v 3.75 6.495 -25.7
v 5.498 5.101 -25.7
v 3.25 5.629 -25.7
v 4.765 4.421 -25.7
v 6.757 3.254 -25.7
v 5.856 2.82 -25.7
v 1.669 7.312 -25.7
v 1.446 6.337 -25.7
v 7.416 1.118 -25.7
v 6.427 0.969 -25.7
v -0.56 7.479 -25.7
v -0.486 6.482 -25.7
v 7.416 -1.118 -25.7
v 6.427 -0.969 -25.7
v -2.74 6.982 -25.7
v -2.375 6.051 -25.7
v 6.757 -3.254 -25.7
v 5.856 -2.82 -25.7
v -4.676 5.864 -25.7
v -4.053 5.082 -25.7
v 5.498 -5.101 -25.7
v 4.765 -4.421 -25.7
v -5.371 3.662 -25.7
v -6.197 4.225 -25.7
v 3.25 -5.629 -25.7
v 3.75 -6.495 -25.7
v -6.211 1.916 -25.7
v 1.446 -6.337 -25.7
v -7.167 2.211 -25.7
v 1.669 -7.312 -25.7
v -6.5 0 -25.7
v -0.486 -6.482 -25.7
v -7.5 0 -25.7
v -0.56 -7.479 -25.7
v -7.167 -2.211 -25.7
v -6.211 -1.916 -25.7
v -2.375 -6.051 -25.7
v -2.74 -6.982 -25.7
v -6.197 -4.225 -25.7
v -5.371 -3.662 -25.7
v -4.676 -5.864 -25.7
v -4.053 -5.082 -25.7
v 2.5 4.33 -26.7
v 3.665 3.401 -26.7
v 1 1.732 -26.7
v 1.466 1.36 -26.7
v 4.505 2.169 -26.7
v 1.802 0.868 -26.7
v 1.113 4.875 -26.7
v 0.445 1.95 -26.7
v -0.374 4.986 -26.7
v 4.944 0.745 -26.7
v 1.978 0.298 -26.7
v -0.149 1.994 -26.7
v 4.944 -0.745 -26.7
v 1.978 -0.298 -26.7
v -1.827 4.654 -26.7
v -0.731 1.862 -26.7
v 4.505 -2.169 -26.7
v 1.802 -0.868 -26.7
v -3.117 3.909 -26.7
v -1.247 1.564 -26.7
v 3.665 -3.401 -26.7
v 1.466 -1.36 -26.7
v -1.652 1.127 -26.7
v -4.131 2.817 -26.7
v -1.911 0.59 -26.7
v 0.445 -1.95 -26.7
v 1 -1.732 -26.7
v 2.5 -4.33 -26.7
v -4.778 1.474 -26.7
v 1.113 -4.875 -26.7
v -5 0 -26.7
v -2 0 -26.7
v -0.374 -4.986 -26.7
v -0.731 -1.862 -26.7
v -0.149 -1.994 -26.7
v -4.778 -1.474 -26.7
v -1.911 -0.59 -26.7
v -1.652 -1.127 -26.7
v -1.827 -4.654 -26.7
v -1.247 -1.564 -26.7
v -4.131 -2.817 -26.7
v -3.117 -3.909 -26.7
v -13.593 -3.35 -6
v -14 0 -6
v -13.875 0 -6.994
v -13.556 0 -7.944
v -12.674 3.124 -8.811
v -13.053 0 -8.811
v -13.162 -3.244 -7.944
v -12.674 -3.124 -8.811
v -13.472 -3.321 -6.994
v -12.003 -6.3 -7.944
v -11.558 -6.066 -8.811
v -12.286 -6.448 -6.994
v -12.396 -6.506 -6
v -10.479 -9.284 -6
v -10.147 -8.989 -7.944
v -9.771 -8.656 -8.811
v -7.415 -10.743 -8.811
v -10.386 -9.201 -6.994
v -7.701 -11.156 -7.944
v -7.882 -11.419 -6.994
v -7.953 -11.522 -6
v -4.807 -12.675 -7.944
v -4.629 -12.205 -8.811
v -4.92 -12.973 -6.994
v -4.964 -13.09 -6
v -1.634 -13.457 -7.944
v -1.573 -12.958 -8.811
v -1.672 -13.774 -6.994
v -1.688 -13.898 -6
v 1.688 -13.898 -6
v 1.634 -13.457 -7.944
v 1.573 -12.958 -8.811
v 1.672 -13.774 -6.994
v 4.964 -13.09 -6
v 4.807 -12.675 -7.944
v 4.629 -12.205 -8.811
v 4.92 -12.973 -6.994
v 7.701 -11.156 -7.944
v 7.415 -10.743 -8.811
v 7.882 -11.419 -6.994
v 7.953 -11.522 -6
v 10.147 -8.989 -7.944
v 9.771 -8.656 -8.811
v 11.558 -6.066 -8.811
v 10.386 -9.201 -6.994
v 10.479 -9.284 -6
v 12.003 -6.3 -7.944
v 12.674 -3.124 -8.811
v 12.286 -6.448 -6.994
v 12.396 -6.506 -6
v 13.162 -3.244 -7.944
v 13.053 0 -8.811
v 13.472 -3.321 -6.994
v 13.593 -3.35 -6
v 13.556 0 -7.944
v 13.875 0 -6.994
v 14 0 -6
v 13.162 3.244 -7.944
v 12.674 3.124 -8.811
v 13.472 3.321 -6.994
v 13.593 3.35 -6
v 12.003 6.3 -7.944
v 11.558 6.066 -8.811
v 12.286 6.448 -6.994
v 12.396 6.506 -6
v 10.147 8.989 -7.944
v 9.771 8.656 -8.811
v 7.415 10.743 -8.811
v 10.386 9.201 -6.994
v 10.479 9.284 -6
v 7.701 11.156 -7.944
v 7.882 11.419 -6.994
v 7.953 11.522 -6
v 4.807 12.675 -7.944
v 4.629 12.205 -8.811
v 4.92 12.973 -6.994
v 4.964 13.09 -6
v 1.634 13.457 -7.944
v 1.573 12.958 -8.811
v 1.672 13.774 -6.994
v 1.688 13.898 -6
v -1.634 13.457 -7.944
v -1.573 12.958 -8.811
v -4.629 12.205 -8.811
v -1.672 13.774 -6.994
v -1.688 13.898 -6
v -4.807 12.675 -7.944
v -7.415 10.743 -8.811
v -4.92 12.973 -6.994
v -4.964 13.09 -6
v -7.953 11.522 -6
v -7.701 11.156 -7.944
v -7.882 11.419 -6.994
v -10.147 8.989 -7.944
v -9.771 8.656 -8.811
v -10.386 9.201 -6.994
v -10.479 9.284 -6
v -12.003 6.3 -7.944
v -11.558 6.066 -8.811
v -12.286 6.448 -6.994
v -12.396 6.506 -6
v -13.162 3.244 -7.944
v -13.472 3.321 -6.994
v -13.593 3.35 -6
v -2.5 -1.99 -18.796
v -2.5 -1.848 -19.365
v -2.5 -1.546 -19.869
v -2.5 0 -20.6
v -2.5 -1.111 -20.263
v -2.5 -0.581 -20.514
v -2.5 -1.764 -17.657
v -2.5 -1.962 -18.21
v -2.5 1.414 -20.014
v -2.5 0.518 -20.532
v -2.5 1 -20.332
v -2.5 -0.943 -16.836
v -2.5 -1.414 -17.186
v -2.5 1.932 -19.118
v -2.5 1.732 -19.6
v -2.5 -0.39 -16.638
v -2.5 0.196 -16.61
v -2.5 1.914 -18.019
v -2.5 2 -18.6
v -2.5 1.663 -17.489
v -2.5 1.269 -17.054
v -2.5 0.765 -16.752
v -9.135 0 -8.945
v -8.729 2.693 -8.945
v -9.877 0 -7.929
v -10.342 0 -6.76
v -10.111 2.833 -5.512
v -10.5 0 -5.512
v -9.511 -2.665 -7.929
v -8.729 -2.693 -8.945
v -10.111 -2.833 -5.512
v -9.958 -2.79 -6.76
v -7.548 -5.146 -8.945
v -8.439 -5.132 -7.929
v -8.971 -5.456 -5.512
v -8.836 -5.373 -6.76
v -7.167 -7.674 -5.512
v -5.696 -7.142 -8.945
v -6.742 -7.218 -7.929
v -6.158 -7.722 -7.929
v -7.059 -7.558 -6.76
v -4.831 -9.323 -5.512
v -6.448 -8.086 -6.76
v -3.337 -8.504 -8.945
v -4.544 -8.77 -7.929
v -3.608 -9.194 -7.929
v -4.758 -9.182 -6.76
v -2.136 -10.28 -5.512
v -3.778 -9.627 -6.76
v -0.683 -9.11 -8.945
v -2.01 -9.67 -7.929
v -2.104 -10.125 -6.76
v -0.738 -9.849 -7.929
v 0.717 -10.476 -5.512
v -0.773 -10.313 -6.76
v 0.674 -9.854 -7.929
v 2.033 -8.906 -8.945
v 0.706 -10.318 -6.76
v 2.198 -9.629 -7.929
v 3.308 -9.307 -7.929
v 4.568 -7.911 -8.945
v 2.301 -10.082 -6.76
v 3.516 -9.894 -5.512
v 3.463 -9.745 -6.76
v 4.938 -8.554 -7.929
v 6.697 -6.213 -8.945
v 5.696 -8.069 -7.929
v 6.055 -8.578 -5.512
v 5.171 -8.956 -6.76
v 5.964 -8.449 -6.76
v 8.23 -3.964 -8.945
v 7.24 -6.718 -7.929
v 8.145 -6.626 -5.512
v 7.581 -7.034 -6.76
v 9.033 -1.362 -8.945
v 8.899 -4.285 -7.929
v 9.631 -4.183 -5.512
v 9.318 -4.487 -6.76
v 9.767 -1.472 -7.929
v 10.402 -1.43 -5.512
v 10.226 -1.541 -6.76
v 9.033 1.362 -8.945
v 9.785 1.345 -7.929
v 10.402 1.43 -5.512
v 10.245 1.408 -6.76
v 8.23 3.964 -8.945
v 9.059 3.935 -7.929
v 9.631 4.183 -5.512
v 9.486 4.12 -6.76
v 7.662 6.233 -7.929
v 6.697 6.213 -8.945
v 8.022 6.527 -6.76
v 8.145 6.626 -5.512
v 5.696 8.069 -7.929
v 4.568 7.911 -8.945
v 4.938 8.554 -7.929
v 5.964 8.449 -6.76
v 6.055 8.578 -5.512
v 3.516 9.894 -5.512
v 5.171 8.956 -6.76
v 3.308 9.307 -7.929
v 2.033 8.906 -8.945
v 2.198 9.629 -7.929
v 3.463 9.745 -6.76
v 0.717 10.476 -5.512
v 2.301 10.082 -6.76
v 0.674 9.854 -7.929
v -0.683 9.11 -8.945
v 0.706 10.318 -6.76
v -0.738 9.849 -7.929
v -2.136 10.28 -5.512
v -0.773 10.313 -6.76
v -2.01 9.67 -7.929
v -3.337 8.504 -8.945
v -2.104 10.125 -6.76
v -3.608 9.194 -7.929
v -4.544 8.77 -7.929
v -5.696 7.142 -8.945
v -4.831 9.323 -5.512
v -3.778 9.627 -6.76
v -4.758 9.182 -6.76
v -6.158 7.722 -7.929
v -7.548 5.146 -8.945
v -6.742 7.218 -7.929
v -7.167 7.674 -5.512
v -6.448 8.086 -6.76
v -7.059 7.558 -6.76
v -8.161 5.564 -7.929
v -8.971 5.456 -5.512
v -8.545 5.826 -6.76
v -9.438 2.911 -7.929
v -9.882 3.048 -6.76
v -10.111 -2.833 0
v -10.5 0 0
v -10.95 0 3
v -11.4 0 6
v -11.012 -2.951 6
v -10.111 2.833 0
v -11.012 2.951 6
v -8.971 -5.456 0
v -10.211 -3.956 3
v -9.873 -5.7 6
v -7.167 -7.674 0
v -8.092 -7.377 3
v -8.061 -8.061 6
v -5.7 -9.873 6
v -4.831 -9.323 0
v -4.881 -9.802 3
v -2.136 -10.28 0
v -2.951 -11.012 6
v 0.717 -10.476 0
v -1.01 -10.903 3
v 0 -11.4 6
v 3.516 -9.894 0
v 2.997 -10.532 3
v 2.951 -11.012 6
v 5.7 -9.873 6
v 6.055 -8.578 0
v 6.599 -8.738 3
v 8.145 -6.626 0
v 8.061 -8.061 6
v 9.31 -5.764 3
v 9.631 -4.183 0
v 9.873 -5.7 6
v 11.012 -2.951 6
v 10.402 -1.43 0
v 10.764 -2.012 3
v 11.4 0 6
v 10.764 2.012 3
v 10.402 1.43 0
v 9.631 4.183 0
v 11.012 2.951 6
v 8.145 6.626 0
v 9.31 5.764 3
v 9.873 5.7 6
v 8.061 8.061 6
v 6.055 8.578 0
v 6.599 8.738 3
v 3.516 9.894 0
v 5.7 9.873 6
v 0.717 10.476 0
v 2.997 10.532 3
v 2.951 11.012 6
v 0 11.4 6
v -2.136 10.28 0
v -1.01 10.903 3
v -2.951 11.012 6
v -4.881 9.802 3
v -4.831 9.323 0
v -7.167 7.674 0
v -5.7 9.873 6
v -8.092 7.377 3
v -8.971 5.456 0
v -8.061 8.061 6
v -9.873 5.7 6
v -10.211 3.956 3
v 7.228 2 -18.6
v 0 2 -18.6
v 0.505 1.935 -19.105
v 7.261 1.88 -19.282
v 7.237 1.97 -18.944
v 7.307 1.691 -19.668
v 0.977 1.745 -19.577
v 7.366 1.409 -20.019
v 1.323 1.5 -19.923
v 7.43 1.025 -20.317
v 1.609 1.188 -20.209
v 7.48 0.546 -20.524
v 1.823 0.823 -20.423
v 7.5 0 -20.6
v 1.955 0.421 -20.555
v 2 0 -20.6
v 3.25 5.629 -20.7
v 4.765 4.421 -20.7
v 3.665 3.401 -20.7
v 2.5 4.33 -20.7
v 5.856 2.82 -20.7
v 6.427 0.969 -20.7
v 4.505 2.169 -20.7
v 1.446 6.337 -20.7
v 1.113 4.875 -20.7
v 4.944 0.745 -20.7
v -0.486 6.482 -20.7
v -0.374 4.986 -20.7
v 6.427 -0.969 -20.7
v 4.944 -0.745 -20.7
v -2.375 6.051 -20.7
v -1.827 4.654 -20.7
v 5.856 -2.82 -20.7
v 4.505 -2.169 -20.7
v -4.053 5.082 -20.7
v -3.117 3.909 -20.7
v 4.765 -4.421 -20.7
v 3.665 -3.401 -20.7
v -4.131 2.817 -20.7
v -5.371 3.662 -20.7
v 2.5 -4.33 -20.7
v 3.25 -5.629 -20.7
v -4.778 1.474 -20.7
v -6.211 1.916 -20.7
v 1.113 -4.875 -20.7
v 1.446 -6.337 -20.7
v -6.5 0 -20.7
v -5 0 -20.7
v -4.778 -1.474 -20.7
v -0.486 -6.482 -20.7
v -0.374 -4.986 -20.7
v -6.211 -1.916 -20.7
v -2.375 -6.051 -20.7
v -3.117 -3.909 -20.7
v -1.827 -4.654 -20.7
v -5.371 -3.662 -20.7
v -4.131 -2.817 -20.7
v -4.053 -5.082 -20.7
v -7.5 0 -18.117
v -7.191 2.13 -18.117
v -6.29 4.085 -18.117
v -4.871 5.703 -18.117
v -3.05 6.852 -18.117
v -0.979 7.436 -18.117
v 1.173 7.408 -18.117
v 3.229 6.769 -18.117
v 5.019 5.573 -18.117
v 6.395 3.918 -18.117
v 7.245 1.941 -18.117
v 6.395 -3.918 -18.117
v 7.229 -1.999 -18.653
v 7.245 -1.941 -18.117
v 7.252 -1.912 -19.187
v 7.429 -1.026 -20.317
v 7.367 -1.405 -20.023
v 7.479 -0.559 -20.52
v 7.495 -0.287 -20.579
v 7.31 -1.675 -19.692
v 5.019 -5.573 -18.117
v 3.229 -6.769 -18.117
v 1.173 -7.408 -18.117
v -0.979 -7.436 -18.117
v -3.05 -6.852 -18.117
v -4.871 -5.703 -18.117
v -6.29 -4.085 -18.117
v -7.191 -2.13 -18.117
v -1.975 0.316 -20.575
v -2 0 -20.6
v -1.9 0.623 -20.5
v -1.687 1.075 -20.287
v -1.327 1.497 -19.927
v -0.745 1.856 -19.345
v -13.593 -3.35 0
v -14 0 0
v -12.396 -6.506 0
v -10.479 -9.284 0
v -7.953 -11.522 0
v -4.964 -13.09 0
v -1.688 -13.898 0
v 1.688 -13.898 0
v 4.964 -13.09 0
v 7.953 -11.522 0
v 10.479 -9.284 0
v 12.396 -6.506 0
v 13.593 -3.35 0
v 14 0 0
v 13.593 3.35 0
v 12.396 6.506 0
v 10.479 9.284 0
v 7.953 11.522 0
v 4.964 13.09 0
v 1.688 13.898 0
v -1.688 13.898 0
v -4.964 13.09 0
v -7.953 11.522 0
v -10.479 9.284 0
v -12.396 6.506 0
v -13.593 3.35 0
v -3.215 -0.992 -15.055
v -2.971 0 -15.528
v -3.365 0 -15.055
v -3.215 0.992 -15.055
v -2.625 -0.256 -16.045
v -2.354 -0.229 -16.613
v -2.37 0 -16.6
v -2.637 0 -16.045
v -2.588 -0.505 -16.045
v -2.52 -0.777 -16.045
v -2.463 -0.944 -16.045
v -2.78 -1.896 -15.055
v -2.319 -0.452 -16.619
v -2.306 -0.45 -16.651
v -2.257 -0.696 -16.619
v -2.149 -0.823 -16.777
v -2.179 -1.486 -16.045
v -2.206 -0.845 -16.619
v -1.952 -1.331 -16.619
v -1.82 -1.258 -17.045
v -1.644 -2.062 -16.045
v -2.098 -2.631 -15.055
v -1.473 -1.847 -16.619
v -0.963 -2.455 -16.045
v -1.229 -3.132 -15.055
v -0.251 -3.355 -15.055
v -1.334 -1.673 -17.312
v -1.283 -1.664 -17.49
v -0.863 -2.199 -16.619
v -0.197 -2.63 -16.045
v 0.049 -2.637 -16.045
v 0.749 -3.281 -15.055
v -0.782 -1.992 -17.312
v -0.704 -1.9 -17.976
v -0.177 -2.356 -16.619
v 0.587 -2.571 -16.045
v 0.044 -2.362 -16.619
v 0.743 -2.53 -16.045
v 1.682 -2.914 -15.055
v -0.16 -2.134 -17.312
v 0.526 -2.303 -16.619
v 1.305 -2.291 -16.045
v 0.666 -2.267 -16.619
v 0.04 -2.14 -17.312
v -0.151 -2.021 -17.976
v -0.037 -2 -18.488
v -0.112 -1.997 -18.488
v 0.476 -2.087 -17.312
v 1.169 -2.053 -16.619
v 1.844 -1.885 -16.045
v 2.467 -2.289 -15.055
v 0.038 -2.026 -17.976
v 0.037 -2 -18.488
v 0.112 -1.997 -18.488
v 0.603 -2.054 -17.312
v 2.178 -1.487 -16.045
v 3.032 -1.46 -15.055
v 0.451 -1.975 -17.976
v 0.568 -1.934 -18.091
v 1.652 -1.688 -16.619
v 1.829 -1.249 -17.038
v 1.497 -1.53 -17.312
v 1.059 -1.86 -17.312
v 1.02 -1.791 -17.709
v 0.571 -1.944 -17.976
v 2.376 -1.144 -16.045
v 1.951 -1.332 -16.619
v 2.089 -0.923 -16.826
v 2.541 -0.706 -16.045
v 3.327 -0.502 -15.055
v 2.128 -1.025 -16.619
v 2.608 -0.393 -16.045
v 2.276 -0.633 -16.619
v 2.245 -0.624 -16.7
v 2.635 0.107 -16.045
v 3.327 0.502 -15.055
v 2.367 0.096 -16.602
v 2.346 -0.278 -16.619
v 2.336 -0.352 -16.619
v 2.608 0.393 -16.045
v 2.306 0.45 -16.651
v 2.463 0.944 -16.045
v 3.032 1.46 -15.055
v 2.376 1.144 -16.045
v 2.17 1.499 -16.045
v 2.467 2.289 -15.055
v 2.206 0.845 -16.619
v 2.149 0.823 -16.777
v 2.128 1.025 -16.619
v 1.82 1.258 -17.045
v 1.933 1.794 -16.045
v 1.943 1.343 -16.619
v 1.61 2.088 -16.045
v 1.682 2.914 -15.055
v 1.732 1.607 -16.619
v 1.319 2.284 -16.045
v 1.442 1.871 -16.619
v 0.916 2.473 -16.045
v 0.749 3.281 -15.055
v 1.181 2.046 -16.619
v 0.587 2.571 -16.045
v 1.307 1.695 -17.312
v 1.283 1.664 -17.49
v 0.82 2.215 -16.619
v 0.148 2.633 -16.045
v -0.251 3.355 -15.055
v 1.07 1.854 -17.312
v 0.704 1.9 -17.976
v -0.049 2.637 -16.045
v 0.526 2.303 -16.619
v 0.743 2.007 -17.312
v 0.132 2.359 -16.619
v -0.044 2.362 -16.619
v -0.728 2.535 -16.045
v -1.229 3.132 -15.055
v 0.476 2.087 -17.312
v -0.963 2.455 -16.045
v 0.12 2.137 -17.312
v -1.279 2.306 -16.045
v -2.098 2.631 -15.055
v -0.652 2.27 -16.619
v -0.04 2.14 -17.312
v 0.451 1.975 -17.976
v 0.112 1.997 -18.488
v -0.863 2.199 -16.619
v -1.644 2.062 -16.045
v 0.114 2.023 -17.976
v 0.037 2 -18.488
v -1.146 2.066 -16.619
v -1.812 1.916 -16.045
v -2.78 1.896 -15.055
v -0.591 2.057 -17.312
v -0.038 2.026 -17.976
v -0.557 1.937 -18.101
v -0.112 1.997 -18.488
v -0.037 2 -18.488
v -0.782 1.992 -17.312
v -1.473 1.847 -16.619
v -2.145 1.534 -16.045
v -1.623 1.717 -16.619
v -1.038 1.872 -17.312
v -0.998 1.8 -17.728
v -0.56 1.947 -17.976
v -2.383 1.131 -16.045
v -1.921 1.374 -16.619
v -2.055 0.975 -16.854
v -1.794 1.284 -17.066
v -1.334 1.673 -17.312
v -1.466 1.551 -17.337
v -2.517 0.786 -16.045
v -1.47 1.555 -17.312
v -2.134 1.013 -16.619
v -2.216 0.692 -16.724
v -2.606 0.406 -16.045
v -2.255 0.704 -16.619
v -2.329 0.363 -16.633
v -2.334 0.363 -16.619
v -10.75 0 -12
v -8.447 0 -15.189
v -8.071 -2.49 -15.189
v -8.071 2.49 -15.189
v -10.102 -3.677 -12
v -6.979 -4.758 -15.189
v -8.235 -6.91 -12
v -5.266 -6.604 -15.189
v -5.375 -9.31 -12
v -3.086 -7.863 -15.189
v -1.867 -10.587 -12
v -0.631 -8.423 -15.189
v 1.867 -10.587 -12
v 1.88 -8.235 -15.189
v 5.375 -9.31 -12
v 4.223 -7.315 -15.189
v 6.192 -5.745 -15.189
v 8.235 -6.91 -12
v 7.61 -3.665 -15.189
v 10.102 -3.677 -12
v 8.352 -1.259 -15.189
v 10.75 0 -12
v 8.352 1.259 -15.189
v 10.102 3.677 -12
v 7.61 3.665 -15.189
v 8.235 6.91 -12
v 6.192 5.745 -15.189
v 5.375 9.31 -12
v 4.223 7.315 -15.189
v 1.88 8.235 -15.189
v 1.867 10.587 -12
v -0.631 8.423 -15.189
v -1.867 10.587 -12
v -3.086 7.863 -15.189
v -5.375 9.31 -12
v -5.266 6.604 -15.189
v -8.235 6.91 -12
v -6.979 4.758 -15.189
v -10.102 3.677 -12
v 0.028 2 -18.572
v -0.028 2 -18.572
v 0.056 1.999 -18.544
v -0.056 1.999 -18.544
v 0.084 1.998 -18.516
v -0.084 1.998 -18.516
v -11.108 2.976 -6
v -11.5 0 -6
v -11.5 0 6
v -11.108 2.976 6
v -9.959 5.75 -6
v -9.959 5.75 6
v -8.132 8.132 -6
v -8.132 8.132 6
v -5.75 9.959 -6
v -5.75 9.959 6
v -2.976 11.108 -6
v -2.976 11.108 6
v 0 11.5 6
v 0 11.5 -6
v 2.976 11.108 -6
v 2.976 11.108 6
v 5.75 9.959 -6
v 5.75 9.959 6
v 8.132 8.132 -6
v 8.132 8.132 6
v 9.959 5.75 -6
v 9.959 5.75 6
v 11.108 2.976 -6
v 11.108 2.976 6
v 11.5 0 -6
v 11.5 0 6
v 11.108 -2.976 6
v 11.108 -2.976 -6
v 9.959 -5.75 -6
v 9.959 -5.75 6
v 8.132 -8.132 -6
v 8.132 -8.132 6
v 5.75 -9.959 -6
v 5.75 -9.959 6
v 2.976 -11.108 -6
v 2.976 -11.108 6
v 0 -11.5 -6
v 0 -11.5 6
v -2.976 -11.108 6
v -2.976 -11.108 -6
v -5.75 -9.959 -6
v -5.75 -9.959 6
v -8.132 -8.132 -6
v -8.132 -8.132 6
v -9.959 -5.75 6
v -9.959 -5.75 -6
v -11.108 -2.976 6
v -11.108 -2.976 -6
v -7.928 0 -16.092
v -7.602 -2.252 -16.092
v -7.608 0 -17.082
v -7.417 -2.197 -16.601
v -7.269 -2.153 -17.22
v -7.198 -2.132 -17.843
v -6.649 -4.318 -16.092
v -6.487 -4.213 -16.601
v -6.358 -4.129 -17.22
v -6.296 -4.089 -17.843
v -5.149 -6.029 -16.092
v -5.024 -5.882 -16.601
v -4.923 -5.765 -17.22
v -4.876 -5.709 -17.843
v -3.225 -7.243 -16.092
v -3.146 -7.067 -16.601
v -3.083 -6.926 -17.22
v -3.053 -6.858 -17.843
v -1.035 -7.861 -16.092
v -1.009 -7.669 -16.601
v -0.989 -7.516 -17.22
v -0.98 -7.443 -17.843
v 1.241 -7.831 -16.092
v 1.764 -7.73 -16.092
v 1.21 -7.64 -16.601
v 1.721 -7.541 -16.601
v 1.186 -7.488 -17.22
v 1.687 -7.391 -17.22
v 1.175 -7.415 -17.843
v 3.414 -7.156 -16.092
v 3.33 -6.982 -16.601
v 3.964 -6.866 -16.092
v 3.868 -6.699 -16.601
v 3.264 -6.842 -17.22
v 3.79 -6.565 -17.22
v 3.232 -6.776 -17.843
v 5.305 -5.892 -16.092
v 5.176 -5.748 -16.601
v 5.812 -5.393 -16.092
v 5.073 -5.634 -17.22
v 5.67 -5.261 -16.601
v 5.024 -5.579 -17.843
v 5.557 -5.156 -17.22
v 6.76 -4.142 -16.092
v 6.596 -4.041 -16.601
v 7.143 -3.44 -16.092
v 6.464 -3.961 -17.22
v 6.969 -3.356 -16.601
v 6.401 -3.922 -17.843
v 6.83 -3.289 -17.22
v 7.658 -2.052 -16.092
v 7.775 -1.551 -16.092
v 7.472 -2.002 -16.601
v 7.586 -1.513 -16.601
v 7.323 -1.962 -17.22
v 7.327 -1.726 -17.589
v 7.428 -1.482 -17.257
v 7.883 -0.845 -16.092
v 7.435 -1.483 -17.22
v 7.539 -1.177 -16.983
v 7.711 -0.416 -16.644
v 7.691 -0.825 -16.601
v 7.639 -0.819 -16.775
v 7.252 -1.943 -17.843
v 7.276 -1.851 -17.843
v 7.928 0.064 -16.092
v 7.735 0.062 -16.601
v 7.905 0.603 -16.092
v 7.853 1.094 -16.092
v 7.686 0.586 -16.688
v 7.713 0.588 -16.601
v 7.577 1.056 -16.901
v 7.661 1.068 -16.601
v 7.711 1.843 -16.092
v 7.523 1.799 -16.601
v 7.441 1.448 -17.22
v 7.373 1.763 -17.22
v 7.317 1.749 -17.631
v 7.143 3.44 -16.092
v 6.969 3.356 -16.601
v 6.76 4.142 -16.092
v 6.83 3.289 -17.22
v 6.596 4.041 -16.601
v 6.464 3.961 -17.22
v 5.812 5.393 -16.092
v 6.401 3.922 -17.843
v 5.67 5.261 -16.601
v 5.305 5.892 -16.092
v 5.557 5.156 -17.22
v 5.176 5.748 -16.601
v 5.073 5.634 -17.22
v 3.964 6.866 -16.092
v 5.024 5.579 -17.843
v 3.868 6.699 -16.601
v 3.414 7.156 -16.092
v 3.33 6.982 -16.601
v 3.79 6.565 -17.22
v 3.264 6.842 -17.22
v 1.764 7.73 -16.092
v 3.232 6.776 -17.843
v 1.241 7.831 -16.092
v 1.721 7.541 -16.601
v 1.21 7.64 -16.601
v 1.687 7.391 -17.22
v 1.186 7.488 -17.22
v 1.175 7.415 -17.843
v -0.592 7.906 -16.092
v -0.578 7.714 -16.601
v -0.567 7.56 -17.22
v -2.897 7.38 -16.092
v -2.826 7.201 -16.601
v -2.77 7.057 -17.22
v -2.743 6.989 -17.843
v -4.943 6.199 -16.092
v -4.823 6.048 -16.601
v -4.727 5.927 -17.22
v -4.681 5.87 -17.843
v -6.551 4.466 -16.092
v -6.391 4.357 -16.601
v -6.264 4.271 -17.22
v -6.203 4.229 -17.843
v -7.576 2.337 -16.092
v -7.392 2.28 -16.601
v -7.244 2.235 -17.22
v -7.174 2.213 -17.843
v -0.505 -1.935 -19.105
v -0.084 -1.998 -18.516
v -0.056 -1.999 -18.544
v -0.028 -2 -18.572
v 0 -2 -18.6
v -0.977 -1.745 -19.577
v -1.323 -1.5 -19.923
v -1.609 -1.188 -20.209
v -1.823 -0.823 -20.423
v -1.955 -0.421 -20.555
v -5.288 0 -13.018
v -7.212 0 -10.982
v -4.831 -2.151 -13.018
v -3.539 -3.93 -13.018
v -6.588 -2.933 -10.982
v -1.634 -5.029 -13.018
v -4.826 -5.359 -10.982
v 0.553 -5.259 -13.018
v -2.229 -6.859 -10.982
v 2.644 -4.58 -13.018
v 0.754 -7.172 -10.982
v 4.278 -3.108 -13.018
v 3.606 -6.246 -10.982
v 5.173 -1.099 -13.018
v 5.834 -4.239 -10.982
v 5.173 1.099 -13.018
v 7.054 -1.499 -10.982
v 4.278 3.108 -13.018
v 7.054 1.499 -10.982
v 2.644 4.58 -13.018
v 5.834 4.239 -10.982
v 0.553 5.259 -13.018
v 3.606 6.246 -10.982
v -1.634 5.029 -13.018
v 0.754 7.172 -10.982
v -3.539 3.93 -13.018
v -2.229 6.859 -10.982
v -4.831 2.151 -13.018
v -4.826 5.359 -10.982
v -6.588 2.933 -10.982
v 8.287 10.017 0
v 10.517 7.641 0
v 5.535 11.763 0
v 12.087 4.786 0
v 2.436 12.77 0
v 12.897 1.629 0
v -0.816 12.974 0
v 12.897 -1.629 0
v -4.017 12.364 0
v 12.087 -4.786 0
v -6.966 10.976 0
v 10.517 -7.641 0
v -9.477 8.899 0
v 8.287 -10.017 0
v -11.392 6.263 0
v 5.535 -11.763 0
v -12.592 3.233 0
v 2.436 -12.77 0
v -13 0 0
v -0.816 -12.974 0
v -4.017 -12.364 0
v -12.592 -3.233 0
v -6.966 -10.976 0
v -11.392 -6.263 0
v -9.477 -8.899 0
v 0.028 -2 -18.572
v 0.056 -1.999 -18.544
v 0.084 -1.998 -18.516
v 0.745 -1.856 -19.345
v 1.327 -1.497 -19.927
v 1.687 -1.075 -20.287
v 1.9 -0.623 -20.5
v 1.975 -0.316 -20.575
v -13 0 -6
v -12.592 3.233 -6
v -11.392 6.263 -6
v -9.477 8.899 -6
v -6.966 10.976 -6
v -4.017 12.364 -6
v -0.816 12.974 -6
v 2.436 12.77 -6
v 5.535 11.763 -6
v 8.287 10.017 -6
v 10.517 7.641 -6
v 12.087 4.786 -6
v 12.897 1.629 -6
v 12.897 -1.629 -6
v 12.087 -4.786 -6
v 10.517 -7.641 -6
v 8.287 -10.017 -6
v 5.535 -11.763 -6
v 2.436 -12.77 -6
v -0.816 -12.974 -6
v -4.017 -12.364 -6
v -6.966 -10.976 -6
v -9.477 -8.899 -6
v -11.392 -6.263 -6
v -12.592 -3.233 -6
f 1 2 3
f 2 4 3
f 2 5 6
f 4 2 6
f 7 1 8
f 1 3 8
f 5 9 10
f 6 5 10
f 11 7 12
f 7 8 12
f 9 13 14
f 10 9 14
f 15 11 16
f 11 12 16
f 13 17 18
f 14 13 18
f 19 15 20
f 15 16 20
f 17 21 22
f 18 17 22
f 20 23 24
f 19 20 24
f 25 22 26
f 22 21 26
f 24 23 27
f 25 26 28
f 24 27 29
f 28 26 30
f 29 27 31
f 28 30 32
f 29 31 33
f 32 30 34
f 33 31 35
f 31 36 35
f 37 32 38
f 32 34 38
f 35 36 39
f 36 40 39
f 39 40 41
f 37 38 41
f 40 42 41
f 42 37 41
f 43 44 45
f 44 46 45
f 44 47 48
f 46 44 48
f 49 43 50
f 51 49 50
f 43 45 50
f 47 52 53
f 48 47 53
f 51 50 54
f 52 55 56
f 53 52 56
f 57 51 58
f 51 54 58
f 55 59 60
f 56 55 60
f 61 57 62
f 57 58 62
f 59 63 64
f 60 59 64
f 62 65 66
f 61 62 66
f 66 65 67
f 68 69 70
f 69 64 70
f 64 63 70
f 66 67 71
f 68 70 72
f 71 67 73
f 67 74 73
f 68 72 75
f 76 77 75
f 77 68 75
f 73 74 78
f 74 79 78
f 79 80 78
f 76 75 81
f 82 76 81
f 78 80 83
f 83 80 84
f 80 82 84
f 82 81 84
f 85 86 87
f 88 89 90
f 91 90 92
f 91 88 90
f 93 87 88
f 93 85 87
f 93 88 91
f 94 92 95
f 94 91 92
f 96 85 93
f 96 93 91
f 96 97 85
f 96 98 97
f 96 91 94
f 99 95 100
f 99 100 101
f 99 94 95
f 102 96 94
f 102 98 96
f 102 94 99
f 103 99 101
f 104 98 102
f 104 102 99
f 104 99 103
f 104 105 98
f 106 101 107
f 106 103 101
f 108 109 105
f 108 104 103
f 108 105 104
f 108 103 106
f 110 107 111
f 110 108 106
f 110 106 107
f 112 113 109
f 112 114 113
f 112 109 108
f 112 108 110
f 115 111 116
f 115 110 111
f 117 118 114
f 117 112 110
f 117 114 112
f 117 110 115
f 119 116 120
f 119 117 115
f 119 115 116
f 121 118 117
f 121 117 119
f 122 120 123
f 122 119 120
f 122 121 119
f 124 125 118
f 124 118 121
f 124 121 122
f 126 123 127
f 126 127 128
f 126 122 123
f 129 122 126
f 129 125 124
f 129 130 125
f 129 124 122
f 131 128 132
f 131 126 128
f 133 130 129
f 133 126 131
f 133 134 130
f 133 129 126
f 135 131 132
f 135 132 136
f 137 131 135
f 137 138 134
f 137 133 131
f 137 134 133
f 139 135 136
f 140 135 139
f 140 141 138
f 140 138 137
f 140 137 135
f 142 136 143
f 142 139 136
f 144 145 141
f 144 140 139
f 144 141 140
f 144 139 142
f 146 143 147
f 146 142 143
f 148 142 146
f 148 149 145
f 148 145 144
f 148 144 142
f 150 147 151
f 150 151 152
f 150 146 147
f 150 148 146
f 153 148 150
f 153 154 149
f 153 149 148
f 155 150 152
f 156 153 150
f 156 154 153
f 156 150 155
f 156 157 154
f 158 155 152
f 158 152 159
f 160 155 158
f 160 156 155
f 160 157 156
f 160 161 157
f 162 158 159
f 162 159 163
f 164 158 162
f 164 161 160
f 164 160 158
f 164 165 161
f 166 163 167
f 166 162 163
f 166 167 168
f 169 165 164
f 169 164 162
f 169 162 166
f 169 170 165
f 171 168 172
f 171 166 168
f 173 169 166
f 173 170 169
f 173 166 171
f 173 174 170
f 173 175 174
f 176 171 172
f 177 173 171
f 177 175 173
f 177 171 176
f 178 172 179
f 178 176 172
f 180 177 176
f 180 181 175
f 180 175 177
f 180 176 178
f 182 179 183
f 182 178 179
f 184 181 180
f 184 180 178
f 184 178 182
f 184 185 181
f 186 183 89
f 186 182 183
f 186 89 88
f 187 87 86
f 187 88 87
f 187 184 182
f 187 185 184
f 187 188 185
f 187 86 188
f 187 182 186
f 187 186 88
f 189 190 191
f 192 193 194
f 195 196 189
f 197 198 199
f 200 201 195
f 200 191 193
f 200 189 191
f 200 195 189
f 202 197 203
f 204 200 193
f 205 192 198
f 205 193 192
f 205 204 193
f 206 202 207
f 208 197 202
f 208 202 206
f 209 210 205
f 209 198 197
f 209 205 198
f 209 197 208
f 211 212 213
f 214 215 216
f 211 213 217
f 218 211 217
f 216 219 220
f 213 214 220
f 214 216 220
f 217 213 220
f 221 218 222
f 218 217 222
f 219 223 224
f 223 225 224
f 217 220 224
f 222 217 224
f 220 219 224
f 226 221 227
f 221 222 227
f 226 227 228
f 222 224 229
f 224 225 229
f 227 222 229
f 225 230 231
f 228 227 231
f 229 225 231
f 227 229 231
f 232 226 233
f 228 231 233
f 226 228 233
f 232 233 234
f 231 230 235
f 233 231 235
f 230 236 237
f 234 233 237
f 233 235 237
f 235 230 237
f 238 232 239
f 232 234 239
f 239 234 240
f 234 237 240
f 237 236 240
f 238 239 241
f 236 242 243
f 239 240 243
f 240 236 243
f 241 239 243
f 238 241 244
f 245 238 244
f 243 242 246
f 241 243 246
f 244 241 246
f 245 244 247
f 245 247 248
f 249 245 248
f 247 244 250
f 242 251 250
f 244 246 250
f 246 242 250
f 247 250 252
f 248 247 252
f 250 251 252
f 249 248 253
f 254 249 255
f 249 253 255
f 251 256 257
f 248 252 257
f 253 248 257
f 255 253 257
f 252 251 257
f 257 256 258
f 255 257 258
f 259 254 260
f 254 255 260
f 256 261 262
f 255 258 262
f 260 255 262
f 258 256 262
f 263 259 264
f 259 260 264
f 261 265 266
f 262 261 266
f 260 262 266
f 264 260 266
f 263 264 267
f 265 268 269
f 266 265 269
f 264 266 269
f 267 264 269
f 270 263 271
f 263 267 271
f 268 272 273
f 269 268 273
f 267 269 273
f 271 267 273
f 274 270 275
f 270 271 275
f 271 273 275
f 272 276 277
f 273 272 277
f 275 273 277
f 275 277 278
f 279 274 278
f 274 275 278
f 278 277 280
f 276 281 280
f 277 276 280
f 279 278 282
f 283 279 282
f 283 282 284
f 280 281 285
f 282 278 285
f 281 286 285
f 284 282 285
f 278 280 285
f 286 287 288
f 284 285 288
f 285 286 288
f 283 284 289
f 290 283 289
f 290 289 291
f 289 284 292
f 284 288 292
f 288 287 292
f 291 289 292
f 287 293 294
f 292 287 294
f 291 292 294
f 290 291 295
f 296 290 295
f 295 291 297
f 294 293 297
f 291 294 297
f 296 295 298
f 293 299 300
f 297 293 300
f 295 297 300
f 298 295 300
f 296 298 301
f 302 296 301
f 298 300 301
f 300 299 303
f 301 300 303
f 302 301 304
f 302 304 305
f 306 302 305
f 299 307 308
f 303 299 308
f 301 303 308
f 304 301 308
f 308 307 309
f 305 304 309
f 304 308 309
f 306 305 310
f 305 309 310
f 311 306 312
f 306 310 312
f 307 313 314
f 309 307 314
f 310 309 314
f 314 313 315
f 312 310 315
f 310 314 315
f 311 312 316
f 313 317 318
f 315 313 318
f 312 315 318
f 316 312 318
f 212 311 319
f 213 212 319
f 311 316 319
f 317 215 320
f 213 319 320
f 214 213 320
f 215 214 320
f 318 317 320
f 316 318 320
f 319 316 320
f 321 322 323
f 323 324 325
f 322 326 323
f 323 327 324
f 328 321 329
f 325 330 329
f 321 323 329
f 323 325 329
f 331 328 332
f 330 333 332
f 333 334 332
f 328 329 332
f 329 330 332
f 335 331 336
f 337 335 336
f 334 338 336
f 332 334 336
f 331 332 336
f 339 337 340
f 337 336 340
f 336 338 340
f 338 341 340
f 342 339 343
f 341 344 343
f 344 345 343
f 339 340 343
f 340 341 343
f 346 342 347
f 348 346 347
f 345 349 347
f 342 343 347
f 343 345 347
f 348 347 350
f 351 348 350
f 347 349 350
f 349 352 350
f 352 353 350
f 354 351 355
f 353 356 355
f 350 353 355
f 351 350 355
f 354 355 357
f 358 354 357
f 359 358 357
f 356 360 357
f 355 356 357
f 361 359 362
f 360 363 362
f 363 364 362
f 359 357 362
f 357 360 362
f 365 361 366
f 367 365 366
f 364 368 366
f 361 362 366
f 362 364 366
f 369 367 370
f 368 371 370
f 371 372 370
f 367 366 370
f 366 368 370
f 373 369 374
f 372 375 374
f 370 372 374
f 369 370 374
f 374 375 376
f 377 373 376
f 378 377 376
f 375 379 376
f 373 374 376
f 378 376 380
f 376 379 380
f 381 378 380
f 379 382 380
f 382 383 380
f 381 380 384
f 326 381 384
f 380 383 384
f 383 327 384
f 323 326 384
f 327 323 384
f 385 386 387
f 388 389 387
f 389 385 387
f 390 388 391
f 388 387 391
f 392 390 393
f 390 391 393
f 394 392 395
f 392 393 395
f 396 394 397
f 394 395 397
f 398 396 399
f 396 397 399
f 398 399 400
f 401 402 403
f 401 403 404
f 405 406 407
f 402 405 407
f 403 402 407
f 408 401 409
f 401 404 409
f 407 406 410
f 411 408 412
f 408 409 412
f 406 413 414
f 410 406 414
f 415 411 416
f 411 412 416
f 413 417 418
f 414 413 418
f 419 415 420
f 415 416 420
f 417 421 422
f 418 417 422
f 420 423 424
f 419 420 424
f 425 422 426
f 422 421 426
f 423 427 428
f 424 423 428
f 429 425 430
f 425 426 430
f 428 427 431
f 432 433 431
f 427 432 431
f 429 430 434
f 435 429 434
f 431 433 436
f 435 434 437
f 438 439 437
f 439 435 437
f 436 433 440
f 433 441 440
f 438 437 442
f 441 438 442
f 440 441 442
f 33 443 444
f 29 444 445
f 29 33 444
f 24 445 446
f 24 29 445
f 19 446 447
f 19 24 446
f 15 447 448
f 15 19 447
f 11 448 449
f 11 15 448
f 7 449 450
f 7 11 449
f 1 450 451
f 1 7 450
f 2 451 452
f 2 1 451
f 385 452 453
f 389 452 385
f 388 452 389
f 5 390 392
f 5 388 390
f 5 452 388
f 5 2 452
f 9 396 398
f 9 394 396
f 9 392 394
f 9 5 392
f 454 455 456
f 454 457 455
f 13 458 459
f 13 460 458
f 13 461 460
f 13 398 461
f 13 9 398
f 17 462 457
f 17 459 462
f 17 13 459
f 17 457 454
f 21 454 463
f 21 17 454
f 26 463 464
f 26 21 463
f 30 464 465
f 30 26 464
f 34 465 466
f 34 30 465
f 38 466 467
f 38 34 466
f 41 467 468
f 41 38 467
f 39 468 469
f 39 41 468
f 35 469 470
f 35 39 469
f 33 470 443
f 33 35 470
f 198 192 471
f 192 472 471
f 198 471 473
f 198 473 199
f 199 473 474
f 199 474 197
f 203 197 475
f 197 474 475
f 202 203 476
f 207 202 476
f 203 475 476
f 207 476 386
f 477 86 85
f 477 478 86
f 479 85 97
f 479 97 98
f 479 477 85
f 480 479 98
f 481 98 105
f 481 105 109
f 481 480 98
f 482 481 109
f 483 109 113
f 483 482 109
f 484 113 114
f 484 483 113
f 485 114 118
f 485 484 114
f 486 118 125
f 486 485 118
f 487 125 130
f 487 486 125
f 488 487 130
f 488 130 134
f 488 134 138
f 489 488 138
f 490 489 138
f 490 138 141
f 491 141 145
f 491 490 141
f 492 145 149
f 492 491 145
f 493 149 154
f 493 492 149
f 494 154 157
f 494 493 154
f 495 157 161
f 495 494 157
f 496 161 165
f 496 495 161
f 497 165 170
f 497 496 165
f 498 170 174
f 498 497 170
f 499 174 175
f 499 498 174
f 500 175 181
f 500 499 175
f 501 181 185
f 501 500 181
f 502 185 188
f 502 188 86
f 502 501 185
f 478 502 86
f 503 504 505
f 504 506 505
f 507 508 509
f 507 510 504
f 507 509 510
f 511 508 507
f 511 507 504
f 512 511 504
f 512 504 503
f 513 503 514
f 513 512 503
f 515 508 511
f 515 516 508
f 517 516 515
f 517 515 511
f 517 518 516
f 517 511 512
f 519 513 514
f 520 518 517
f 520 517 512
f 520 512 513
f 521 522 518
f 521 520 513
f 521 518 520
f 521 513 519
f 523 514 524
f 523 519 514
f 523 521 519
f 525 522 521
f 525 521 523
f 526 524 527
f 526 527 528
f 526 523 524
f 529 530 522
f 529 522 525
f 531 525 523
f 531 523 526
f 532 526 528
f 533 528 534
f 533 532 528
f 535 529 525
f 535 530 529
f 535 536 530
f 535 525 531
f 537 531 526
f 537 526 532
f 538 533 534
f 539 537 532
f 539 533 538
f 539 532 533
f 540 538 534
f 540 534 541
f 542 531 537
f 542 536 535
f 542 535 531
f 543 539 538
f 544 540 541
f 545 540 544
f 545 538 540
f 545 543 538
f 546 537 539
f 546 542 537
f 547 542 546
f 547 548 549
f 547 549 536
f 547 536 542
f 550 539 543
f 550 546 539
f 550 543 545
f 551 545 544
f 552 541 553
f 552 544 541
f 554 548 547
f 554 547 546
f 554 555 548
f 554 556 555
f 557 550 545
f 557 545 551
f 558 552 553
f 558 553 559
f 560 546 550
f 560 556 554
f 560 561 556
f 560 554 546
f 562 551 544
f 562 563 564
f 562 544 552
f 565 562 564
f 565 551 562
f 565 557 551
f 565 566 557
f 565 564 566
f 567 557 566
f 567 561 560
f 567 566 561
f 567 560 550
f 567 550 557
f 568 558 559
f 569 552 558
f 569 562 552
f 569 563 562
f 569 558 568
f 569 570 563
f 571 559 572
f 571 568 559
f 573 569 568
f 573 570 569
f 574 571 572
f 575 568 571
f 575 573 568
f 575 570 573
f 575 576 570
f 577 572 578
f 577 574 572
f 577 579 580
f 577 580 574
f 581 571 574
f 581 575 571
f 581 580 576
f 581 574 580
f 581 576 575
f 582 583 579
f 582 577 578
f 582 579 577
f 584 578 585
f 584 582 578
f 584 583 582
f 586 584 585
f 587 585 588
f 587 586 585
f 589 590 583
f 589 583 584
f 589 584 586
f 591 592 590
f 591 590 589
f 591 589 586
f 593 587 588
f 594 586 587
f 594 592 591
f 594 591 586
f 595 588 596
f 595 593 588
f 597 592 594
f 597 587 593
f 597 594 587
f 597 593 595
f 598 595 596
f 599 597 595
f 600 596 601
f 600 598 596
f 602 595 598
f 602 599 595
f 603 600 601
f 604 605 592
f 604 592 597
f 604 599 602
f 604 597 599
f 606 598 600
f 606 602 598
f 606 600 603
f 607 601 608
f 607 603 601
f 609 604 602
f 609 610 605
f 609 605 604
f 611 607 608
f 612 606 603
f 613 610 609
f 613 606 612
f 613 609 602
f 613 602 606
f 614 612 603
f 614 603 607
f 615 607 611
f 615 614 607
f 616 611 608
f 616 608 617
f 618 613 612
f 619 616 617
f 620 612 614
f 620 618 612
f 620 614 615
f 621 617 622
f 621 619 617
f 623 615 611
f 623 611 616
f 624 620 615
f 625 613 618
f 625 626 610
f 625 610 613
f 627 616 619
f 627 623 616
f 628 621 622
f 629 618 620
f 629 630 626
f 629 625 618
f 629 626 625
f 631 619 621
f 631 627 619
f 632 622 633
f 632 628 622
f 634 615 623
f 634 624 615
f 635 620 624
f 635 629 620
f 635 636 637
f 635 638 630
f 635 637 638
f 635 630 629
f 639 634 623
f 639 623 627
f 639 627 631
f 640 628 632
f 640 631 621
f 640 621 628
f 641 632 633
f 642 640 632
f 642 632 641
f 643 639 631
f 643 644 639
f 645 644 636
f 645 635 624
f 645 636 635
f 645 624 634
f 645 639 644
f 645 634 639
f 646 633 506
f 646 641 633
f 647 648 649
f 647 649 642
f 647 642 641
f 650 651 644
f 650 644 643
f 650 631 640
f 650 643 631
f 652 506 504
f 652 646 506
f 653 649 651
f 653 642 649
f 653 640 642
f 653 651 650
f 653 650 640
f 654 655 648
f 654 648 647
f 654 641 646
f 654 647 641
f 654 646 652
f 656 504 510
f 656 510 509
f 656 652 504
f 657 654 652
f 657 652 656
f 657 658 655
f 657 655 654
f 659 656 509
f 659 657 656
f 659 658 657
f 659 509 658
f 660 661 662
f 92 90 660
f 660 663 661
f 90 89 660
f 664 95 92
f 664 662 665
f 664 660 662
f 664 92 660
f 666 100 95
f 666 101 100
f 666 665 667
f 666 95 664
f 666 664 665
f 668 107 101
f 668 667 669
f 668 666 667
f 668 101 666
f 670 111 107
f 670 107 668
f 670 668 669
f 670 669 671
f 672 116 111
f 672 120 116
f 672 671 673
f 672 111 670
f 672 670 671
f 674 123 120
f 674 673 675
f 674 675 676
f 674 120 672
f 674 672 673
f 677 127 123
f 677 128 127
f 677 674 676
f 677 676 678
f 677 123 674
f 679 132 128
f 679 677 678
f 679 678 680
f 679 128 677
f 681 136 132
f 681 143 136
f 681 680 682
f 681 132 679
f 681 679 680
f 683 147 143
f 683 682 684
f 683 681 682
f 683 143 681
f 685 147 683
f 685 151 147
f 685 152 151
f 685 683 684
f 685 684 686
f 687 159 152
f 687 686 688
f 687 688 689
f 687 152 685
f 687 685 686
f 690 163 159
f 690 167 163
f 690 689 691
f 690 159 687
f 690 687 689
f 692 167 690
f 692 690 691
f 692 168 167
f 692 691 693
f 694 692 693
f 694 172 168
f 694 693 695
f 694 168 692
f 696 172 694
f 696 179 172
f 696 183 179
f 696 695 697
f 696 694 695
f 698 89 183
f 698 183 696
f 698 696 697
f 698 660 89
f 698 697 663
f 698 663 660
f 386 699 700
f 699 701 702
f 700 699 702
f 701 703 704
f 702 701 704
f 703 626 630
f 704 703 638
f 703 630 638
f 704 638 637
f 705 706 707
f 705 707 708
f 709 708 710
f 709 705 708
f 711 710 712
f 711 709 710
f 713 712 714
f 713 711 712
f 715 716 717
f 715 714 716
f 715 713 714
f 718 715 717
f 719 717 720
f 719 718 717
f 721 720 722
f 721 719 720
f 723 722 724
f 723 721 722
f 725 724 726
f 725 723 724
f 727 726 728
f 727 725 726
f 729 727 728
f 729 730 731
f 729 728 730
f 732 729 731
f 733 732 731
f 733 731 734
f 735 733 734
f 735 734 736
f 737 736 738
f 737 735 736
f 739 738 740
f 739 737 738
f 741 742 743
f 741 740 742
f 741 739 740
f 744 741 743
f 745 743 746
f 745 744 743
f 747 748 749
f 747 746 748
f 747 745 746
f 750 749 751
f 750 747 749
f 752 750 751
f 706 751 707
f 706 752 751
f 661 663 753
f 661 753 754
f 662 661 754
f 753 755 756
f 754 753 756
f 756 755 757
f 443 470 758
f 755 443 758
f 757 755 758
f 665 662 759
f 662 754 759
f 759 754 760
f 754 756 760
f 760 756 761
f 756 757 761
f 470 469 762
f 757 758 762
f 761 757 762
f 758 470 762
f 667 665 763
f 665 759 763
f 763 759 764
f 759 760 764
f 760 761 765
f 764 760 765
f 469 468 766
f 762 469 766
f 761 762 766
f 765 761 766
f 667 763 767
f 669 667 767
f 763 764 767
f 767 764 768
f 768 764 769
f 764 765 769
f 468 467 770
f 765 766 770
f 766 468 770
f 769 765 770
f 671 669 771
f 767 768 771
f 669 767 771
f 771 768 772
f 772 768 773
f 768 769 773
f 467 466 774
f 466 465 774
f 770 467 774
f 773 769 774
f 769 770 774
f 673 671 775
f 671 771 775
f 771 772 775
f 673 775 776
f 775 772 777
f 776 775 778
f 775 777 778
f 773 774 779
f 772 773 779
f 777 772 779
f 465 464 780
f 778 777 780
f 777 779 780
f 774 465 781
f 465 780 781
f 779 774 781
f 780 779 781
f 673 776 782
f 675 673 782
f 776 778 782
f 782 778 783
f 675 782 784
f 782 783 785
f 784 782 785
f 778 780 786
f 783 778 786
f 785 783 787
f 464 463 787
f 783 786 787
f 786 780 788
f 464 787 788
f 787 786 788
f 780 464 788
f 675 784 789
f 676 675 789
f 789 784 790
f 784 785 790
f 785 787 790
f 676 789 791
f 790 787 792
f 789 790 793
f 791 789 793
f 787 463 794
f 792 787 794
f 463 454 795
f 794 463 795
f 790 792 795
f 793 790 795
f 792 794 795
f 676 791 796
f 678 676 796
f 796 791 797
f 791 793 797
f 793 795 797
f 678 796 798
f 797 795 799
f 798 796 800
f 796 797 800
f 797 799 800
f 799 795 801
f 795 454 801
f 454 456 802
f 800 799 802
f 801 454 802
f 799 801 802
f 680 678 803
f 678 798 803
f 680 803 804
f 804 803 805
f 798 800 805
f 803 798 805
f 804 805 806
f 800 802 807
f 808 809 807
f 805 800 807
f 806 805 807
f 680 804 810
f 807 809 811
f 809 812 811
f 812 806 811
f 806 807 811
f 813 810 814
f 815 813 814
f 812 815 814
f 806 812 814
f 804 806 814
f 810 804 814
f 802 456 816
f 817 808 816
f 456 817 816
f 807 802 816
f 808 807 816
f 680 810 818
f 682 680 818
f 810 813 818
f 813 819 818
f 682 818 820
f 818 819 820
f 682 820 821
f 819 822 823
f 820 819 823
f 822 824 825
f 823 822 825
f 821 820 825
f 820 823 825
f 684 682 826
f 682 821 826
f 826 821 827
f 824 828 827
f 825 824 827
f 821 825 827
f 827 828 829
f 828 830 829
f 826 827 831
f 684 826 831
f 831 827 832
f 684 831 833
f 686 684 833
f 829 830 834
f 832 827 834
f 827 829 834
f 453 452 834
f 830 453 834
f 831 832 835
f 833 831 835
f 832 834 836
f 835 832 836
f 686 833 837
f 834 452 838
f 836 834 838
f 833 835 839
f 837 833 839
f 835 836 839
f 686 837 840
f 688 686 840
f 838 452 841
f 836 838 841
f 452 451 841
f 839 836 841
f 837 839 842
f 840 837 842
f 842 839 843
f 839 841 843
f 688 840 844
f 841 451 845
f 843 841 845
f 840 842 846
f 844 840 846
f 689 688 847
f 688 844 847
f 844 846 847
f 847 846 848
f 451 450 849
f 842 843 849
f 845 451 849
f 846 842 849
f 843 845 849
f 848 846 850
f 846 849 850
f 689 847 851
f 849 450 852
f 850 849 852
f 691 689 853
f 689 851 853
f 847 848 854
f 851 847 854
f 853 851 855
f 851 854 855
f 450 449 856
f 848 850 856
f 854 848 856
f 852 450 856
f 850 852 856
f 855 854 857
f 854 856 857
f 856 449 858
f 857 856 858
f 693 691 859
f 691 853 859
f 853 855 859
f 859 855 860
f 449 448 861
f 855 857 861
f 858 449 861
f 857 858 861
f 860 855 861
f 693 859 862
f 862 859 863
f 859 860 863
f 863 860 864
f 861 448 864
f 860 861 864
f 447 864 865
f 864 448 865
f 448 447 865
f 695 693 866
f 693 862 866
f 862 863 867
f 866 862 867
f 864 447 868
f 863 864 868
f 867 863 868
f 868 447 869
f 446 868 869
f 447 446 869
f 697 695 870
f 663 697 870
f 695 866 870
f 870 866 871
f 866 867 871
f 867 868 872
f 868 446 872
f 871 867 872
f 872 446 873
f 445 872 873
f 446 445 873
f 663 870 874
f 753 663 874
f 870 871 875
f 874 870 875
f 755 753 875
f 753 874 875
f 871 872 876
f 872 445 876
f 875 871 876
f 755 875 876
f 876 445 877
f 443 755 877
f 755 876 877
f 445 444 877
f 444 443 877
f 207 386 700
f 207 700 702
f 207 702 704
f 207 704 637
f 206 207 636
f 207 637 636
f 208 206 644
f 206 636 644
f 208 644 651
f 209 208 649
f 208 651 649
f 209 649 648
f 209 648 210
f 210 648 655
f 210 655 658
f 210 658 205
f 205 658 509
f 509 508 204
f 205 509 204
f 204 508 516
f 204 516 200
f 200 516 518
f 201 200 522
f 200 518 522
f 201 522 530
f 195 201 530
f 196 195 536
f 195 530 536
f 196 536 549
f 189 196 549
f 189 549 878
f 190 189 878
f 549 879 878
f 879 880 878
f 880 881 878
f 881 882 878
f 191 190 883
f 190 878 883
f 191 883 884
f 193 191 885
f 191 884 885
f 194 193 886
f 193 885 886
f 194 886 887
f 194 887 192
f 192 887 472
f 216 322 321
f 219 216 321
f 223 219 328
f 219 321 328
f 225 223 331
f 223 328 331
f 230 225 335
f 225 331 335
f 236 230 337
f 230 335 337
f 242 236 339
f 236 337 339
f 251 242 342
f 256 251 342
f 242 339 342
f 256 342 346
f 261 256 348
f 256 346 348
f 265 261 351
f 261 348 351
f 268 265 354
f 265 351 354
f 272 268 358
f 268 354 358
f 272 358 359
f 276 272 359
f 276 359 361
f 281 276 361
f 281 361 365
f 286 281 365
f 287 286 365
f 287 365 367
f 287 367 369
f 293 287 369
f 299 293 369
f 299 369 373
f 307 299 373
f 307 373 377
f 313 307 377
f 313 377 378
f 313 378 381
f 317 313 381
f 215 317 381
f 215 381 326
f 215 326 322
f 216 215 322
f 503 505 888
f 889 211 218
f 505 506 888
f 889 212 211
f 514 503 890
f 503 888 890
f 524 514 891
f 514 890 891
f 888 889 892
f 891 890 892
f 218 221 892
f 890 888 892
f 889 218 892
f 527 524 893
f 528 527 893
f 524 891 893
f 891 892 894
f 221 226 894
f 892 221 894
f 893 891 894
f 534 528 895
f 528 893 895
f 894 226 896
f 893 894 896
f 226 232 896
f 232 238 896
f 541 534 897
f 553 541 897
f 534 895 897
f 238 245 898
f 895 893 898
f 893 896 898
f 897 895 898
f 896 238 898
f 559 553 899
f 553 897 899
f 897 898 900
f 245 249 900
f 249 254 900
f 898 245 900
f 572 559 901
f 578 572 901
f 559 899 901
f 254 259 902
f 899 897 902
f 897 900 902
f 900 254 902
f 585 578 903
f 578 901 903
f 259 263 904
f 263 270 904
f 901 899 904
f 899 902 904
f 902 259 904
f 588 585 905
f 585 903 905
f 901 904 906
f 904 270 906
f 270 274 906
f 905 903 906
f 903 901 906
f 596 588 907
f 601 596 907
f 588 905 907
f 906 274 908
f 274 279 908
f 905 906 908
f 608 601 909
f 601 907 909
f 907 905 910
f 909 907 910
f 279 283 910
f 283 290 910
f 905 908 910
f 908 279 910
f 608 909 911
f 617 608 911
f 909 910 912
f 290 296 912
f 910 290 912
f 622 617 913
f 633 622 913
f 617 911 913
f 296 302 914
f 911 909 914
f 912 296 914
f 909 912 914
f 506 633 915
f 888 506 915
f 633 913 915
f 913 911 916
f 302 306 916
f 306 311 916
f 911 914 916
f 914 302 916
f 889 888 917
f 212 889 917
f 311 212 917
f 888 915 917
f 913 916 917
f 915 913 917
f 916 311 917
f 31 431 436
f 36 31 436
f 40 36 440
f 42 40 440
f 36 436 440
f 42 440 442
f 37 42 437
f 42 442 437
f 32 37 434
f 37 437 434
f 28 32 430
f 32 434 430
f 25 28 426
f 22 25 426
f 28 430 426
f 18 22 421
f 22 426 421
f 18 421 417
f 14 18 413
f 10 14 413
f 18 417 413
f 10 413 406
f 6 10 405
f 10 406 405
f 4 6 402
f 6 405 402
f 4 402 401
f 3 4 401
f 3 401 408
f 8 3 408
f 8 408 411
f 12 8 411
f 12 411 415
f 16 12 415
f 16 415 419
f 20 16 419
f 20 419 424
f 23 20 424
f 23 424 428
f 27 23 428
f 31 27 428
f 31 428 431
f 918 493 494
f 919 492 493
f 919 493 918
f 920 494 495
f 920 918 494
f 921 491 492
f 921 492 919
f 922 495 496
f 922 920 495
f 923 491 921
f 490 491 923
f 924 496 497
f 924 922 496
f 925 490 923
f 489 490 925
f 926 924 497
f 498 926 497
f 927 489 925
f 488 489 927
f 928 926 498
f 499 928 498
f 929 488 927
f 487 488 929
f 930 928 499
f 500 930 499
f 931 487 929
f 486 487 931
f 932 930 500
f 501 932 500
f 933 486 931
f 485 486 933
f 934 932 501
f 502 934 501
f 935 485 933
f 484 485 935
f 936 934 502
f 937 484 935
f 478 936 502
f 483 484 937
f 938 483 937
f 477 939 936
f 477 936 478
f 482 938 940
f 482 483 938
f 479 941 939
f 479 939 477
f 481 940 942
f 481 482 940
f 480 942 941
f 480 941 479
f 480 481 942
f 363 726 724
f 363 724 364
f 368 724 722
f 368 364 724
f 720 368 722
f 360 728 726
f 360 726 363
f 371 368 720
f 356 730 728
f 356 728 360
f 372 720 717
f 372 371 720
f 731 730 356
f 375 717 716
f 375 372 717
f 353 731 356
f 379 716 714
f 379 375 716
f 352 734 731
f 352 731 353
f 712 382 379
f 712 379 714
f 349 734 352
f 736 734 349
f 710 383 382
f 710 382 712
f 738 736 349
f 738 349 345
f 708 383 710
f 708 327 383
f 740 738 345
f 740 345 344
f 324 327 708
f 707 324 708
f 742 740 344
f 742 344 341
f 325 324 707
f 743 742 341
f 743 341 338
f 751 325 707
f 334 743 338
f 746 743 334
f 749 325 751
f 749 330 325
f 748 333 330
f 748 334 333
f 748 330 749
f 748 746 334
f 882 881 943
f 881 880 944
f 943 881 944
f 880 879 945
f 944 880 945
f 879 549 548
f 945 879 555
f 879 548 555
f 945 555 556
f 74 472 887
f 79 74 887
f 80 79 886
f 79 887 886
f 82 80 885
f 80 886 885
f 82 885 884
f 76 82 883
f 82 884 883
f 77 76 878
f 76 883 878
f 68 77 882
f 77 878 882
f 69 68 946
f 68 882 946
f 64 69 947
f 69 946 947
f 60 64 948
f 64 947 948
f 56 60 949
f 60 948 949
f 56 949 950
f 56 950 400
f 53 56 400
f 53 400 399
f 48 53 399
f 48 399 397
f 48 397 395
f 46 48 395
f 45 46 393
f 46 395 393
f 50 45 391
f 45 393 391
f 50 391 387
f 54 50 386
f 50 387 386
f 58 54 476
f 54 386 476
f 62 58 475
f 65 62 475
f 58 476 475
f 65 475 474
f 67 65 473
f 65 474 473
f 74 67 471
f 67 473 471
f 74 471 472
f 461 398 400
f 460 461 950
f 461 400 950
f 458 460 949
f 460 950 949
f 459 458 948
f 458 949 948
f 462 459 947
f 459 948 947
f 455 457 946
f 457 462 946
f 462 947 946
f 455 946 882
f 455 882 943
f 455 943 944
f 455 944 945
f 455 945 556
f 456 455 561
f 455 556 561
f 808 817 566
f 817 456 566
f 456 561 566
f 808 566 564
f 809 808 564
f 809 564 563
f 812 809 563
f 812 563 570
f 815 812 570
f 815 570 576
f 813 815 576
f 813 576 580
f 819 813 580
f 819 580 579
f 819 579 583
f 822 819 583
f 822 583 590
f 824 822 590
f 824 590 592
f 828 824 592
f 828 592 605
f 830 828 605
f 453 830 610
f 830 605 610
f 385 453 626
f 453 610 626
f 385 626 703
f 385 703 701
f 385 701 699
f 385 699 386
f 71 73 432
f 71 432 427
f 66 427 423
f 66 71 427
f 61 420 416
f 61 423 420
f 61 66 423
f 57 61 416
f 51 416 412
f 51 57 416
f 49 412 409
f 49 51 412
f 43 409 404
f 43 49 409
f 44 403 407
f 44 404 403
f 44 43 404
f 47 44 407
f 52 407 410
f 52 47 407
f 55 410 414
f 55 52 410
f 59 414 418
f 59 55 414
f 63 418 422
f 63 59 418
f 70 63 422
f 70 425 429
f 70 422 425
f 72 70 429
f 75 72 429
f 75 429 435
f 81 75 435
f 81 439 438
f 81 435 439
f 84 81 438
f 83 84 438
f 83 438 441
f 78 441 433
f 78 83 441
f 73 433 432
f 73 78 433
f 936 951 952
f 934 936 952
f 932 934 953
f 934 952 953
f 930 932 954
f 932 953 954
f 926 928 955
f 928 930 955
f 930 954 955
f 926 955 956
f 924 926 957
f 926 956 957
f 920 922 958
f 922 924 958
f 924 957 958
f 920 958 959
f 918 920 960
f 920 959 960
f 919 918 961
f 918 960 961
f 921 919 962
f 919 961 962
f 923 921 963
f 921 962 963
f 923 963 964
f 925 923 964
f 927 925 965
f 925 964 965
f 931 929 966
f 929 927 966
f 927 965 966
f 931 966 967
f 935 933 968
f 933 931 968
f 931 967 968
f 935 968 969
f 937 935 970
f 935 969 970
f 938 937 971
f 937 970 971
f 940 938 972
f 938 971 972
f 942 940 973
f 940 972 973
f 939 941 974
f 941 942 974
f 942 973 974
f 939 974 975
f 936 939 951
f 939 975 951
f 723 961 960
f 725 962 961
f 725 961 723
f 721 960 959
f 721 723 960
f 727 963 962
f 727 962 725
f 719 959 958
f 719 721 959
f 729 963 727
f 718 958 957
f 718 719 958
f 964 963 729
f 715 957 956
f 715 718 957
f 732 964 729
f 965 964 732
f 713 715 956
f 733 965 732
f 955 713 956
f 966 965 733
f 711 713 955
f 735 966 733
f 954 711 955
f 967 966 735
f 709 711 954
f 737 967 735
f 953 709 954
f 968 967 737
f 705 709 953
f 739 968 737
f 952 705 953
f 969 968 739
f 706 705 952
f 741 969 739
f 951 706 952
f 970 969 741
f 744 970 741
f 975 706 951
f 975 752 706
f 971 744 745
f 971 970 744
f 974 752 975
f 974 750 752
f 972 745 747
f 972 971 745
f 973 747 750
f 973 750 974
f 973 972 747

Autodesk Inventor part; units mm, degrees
ref_plane "YZ Plane" through (0, 0, 0) normal (1, 0, 0) x (0, 1, 0)
ref_plane "XZ Plane" through (0, 0, 0) normal (0, 1, 0) x (-1, 0, 0)
ref_plane "XY Plane" through (0, 0, 0) normal (0, 0, 1) x (1, 0, 0)
sketch "Sketch1" plane through (0, 0, 0) normal (0, 1, 0) x (-1, 0, 0)
  line L0 (0, -27.5114) -> (0, 22.3977)
  line L1 (11.5, -6) -> (10.5, -6)
  line L2 (10.5, -6) -> (10.5, 0)
  line L3 (10.5, 0) -> (11.5, 0)
  line L4 (11.5, 0) -> (11.5, -6)
  line L5 (14, -7.5) -> (10.5, -7.5)
  line L6 (10.5, -5.5121) -> (10.5, -6)
  line L7 (10.5, -6) -> (14, -6)
  line L8 (14, -6) -> (14, -5.8832)
  line L9 (28.1307, 0) -> (-27.0173, 0)
  line L10 (7.5, -25.7) -> (6.5, -25.7)
  line L11 (6.5, -25.7) -> (6.5, -20.7)
  line L12 (6.5, -20.7) -> (7.5, -20.7)
  line L13 (7.5, -20.7) -> (7.5, -25.7)
  line L14 (5, -26.7) -> (2, -26.7)
  line L15 (2, -26.7) -> (2, -20.7)
  line L16 (2, -20.7) -> (5, -20.7)
  line L17 (5, -20.7) -> (5, -26.7)
  line L18 (7.5, -20.7) -> (2, -20.7)
  line L19 (2, -20.7) -> (2, -18.4879)
  line L20 (2, -16.5) -> (7.5, -16.5)
  line L21 (7.5, -18.1168) -> (7.5, -20.7)
  line L22 (3.3649, -15.0548) -> (9.1351, -8.9452)
  line L23 (8.4466, -15.1893) -> (13.0534, -8.8107)
  arc A0 (8.4466, -15.1893) -> (7.5, -18.1168) centre (12.5, -18.1168) ccw
  arc A1 (13.0534, -8.8107) -> (14, -5.8832) centre (9, -5.8832) ccw
  arc A2 (9.1351, -8.9452) -> (10.5, -5.5121) centre (5.5, -5.5121) ccw
  arc A3 (3.3649, -15.0548) -> (2, -18.4879) centre (7, -18.4879) ccw
  line L24 (13, -6) -> (14, -6)
  line L25 (14, -6) -> (14, 0)
  line L26 (14, 0) -> (13, 0)
  line L27 (13, 0) -> (13, -6)
  line L28 (11.5, 0) -> (11.5, 6)
  line L29 (11.5, 6) -> (11.4, 6)
  line L30 (11.4, 6) -> (10.5, 0)
  point P0 (0, 0)
  point P1 (11.5, -6)
  point P2 (13.9986, -6)
  point P3 (10.5, -5.5121)
  dimension "d2" = 1
  dimension "d4" = 1.5
  dimension "d5" = 6
  dimension "d6" = 6.5
  dimension "d7" = 1.5
  dimension "d8" = 1
  dimension "d9" = 4.2
  dimension "d10" = 5
  dimension "d11" = 9
  dimension "d12" = 2
  dimension "d13" = 5
  dimension "d14" = 5
  dimension "d15" = 5
  dimension "d17" = 6
  dimension "d20" = 1
  dimension "d21" = 6
  dimension "d22" = 1.5
  dimension "d23" = 13
  dimension "d28" = 6
  dimension "d29" = 0.1
revolve "Revolution1" add sketch "Sketch1" angle 360 about axis through (0, 0, -27.5114) along (0, 0, 1) contours L7 A1 L23 A0 L21 L12 L18 L16 L19 A3 L22 A2 L2 L1 | L1 L2 L3 L4 | L3 L30 L29 L28 | L27 L9 L25 L8 L7 | L16 L17 L14 L15 | L13 L10 L11 L12
sketch "Sketch2" plane through (0, 0, 0) normal (1, 0, 0) x (0, 1, 0)
  line L0 (5, -26.7) -> (-5, -26.7) construction
  line L1 (0, -26.7) -> (0, -18.4879)
  line L2 (2, -18.4879) -> (-2, -18.4879) construction
  line L3 (5, -20.7) -> (-5, -20.7) construction
  circle A0 centre (0, -18.6) radius 2
  point P0 (0, 0)
  dimension "d18" = 4
  dimension "d19" = 2.1
extrude "Extrusion1" cut sketch "Sketch2" along normal blind 14 and the other way blind 2.5
equation "\"d18\" = ft_D"
equation "\"d19\" = 0.5 * ft_D + tol"
equation "\"d24\" = sv_OD + hw_thickness"
equation "\"d26\" = 0.5 * hw_thickness + 0.5 * ft_D"
equation "\"d2\" = hw_thickness"
equation "\"d4\" = 0.25 * hw_length"
equation "\"d5\" = hw_length"
equation "\"d6\" = 0.5 * sv_OD"
equation "\"d7\" = sv_thickness"
equation "\"d8\" = hw_thickness"
equation "\"d9\" = 1.05 * ft_D"
equation "\"d10\" = 0.833333 * hw_length"
equation "\"d11\" = 1.5 * hw_length"
equation "\"d12\" = 0.5 * ft_D"
equation "\"d13\" = fillet_D"
equation "\"d14\" = fillet_D"
equation "\"d15\" = fillet_D"
equation "\"d17\" = hw_length"
equation "\"d20\" = hw_thickness"
equation "\"d21\" = hw_length"
equation "\"d22\" = lv_thickness"
equation "\"d23\" = 0.5 * lv_OD"
equation "\"d28\" = hw_length"
equation "\"d29\" = tol"
equation "\"lv_OD\" = 26"
equation "\"lv_thickness\" = 1.5"
equation "\"hw_thickness\" = 1"
equation "\"hw_length\" = 6"
equation "\"sv_OD\" = 13"
equation "\"sv_thickness\" = 1.5"
equation "\"ft_D\" = 4"
equation "\"fillet_D\" = 5"
equation "\"tol\" = 0.1"
properties part number "fly_funnel"
